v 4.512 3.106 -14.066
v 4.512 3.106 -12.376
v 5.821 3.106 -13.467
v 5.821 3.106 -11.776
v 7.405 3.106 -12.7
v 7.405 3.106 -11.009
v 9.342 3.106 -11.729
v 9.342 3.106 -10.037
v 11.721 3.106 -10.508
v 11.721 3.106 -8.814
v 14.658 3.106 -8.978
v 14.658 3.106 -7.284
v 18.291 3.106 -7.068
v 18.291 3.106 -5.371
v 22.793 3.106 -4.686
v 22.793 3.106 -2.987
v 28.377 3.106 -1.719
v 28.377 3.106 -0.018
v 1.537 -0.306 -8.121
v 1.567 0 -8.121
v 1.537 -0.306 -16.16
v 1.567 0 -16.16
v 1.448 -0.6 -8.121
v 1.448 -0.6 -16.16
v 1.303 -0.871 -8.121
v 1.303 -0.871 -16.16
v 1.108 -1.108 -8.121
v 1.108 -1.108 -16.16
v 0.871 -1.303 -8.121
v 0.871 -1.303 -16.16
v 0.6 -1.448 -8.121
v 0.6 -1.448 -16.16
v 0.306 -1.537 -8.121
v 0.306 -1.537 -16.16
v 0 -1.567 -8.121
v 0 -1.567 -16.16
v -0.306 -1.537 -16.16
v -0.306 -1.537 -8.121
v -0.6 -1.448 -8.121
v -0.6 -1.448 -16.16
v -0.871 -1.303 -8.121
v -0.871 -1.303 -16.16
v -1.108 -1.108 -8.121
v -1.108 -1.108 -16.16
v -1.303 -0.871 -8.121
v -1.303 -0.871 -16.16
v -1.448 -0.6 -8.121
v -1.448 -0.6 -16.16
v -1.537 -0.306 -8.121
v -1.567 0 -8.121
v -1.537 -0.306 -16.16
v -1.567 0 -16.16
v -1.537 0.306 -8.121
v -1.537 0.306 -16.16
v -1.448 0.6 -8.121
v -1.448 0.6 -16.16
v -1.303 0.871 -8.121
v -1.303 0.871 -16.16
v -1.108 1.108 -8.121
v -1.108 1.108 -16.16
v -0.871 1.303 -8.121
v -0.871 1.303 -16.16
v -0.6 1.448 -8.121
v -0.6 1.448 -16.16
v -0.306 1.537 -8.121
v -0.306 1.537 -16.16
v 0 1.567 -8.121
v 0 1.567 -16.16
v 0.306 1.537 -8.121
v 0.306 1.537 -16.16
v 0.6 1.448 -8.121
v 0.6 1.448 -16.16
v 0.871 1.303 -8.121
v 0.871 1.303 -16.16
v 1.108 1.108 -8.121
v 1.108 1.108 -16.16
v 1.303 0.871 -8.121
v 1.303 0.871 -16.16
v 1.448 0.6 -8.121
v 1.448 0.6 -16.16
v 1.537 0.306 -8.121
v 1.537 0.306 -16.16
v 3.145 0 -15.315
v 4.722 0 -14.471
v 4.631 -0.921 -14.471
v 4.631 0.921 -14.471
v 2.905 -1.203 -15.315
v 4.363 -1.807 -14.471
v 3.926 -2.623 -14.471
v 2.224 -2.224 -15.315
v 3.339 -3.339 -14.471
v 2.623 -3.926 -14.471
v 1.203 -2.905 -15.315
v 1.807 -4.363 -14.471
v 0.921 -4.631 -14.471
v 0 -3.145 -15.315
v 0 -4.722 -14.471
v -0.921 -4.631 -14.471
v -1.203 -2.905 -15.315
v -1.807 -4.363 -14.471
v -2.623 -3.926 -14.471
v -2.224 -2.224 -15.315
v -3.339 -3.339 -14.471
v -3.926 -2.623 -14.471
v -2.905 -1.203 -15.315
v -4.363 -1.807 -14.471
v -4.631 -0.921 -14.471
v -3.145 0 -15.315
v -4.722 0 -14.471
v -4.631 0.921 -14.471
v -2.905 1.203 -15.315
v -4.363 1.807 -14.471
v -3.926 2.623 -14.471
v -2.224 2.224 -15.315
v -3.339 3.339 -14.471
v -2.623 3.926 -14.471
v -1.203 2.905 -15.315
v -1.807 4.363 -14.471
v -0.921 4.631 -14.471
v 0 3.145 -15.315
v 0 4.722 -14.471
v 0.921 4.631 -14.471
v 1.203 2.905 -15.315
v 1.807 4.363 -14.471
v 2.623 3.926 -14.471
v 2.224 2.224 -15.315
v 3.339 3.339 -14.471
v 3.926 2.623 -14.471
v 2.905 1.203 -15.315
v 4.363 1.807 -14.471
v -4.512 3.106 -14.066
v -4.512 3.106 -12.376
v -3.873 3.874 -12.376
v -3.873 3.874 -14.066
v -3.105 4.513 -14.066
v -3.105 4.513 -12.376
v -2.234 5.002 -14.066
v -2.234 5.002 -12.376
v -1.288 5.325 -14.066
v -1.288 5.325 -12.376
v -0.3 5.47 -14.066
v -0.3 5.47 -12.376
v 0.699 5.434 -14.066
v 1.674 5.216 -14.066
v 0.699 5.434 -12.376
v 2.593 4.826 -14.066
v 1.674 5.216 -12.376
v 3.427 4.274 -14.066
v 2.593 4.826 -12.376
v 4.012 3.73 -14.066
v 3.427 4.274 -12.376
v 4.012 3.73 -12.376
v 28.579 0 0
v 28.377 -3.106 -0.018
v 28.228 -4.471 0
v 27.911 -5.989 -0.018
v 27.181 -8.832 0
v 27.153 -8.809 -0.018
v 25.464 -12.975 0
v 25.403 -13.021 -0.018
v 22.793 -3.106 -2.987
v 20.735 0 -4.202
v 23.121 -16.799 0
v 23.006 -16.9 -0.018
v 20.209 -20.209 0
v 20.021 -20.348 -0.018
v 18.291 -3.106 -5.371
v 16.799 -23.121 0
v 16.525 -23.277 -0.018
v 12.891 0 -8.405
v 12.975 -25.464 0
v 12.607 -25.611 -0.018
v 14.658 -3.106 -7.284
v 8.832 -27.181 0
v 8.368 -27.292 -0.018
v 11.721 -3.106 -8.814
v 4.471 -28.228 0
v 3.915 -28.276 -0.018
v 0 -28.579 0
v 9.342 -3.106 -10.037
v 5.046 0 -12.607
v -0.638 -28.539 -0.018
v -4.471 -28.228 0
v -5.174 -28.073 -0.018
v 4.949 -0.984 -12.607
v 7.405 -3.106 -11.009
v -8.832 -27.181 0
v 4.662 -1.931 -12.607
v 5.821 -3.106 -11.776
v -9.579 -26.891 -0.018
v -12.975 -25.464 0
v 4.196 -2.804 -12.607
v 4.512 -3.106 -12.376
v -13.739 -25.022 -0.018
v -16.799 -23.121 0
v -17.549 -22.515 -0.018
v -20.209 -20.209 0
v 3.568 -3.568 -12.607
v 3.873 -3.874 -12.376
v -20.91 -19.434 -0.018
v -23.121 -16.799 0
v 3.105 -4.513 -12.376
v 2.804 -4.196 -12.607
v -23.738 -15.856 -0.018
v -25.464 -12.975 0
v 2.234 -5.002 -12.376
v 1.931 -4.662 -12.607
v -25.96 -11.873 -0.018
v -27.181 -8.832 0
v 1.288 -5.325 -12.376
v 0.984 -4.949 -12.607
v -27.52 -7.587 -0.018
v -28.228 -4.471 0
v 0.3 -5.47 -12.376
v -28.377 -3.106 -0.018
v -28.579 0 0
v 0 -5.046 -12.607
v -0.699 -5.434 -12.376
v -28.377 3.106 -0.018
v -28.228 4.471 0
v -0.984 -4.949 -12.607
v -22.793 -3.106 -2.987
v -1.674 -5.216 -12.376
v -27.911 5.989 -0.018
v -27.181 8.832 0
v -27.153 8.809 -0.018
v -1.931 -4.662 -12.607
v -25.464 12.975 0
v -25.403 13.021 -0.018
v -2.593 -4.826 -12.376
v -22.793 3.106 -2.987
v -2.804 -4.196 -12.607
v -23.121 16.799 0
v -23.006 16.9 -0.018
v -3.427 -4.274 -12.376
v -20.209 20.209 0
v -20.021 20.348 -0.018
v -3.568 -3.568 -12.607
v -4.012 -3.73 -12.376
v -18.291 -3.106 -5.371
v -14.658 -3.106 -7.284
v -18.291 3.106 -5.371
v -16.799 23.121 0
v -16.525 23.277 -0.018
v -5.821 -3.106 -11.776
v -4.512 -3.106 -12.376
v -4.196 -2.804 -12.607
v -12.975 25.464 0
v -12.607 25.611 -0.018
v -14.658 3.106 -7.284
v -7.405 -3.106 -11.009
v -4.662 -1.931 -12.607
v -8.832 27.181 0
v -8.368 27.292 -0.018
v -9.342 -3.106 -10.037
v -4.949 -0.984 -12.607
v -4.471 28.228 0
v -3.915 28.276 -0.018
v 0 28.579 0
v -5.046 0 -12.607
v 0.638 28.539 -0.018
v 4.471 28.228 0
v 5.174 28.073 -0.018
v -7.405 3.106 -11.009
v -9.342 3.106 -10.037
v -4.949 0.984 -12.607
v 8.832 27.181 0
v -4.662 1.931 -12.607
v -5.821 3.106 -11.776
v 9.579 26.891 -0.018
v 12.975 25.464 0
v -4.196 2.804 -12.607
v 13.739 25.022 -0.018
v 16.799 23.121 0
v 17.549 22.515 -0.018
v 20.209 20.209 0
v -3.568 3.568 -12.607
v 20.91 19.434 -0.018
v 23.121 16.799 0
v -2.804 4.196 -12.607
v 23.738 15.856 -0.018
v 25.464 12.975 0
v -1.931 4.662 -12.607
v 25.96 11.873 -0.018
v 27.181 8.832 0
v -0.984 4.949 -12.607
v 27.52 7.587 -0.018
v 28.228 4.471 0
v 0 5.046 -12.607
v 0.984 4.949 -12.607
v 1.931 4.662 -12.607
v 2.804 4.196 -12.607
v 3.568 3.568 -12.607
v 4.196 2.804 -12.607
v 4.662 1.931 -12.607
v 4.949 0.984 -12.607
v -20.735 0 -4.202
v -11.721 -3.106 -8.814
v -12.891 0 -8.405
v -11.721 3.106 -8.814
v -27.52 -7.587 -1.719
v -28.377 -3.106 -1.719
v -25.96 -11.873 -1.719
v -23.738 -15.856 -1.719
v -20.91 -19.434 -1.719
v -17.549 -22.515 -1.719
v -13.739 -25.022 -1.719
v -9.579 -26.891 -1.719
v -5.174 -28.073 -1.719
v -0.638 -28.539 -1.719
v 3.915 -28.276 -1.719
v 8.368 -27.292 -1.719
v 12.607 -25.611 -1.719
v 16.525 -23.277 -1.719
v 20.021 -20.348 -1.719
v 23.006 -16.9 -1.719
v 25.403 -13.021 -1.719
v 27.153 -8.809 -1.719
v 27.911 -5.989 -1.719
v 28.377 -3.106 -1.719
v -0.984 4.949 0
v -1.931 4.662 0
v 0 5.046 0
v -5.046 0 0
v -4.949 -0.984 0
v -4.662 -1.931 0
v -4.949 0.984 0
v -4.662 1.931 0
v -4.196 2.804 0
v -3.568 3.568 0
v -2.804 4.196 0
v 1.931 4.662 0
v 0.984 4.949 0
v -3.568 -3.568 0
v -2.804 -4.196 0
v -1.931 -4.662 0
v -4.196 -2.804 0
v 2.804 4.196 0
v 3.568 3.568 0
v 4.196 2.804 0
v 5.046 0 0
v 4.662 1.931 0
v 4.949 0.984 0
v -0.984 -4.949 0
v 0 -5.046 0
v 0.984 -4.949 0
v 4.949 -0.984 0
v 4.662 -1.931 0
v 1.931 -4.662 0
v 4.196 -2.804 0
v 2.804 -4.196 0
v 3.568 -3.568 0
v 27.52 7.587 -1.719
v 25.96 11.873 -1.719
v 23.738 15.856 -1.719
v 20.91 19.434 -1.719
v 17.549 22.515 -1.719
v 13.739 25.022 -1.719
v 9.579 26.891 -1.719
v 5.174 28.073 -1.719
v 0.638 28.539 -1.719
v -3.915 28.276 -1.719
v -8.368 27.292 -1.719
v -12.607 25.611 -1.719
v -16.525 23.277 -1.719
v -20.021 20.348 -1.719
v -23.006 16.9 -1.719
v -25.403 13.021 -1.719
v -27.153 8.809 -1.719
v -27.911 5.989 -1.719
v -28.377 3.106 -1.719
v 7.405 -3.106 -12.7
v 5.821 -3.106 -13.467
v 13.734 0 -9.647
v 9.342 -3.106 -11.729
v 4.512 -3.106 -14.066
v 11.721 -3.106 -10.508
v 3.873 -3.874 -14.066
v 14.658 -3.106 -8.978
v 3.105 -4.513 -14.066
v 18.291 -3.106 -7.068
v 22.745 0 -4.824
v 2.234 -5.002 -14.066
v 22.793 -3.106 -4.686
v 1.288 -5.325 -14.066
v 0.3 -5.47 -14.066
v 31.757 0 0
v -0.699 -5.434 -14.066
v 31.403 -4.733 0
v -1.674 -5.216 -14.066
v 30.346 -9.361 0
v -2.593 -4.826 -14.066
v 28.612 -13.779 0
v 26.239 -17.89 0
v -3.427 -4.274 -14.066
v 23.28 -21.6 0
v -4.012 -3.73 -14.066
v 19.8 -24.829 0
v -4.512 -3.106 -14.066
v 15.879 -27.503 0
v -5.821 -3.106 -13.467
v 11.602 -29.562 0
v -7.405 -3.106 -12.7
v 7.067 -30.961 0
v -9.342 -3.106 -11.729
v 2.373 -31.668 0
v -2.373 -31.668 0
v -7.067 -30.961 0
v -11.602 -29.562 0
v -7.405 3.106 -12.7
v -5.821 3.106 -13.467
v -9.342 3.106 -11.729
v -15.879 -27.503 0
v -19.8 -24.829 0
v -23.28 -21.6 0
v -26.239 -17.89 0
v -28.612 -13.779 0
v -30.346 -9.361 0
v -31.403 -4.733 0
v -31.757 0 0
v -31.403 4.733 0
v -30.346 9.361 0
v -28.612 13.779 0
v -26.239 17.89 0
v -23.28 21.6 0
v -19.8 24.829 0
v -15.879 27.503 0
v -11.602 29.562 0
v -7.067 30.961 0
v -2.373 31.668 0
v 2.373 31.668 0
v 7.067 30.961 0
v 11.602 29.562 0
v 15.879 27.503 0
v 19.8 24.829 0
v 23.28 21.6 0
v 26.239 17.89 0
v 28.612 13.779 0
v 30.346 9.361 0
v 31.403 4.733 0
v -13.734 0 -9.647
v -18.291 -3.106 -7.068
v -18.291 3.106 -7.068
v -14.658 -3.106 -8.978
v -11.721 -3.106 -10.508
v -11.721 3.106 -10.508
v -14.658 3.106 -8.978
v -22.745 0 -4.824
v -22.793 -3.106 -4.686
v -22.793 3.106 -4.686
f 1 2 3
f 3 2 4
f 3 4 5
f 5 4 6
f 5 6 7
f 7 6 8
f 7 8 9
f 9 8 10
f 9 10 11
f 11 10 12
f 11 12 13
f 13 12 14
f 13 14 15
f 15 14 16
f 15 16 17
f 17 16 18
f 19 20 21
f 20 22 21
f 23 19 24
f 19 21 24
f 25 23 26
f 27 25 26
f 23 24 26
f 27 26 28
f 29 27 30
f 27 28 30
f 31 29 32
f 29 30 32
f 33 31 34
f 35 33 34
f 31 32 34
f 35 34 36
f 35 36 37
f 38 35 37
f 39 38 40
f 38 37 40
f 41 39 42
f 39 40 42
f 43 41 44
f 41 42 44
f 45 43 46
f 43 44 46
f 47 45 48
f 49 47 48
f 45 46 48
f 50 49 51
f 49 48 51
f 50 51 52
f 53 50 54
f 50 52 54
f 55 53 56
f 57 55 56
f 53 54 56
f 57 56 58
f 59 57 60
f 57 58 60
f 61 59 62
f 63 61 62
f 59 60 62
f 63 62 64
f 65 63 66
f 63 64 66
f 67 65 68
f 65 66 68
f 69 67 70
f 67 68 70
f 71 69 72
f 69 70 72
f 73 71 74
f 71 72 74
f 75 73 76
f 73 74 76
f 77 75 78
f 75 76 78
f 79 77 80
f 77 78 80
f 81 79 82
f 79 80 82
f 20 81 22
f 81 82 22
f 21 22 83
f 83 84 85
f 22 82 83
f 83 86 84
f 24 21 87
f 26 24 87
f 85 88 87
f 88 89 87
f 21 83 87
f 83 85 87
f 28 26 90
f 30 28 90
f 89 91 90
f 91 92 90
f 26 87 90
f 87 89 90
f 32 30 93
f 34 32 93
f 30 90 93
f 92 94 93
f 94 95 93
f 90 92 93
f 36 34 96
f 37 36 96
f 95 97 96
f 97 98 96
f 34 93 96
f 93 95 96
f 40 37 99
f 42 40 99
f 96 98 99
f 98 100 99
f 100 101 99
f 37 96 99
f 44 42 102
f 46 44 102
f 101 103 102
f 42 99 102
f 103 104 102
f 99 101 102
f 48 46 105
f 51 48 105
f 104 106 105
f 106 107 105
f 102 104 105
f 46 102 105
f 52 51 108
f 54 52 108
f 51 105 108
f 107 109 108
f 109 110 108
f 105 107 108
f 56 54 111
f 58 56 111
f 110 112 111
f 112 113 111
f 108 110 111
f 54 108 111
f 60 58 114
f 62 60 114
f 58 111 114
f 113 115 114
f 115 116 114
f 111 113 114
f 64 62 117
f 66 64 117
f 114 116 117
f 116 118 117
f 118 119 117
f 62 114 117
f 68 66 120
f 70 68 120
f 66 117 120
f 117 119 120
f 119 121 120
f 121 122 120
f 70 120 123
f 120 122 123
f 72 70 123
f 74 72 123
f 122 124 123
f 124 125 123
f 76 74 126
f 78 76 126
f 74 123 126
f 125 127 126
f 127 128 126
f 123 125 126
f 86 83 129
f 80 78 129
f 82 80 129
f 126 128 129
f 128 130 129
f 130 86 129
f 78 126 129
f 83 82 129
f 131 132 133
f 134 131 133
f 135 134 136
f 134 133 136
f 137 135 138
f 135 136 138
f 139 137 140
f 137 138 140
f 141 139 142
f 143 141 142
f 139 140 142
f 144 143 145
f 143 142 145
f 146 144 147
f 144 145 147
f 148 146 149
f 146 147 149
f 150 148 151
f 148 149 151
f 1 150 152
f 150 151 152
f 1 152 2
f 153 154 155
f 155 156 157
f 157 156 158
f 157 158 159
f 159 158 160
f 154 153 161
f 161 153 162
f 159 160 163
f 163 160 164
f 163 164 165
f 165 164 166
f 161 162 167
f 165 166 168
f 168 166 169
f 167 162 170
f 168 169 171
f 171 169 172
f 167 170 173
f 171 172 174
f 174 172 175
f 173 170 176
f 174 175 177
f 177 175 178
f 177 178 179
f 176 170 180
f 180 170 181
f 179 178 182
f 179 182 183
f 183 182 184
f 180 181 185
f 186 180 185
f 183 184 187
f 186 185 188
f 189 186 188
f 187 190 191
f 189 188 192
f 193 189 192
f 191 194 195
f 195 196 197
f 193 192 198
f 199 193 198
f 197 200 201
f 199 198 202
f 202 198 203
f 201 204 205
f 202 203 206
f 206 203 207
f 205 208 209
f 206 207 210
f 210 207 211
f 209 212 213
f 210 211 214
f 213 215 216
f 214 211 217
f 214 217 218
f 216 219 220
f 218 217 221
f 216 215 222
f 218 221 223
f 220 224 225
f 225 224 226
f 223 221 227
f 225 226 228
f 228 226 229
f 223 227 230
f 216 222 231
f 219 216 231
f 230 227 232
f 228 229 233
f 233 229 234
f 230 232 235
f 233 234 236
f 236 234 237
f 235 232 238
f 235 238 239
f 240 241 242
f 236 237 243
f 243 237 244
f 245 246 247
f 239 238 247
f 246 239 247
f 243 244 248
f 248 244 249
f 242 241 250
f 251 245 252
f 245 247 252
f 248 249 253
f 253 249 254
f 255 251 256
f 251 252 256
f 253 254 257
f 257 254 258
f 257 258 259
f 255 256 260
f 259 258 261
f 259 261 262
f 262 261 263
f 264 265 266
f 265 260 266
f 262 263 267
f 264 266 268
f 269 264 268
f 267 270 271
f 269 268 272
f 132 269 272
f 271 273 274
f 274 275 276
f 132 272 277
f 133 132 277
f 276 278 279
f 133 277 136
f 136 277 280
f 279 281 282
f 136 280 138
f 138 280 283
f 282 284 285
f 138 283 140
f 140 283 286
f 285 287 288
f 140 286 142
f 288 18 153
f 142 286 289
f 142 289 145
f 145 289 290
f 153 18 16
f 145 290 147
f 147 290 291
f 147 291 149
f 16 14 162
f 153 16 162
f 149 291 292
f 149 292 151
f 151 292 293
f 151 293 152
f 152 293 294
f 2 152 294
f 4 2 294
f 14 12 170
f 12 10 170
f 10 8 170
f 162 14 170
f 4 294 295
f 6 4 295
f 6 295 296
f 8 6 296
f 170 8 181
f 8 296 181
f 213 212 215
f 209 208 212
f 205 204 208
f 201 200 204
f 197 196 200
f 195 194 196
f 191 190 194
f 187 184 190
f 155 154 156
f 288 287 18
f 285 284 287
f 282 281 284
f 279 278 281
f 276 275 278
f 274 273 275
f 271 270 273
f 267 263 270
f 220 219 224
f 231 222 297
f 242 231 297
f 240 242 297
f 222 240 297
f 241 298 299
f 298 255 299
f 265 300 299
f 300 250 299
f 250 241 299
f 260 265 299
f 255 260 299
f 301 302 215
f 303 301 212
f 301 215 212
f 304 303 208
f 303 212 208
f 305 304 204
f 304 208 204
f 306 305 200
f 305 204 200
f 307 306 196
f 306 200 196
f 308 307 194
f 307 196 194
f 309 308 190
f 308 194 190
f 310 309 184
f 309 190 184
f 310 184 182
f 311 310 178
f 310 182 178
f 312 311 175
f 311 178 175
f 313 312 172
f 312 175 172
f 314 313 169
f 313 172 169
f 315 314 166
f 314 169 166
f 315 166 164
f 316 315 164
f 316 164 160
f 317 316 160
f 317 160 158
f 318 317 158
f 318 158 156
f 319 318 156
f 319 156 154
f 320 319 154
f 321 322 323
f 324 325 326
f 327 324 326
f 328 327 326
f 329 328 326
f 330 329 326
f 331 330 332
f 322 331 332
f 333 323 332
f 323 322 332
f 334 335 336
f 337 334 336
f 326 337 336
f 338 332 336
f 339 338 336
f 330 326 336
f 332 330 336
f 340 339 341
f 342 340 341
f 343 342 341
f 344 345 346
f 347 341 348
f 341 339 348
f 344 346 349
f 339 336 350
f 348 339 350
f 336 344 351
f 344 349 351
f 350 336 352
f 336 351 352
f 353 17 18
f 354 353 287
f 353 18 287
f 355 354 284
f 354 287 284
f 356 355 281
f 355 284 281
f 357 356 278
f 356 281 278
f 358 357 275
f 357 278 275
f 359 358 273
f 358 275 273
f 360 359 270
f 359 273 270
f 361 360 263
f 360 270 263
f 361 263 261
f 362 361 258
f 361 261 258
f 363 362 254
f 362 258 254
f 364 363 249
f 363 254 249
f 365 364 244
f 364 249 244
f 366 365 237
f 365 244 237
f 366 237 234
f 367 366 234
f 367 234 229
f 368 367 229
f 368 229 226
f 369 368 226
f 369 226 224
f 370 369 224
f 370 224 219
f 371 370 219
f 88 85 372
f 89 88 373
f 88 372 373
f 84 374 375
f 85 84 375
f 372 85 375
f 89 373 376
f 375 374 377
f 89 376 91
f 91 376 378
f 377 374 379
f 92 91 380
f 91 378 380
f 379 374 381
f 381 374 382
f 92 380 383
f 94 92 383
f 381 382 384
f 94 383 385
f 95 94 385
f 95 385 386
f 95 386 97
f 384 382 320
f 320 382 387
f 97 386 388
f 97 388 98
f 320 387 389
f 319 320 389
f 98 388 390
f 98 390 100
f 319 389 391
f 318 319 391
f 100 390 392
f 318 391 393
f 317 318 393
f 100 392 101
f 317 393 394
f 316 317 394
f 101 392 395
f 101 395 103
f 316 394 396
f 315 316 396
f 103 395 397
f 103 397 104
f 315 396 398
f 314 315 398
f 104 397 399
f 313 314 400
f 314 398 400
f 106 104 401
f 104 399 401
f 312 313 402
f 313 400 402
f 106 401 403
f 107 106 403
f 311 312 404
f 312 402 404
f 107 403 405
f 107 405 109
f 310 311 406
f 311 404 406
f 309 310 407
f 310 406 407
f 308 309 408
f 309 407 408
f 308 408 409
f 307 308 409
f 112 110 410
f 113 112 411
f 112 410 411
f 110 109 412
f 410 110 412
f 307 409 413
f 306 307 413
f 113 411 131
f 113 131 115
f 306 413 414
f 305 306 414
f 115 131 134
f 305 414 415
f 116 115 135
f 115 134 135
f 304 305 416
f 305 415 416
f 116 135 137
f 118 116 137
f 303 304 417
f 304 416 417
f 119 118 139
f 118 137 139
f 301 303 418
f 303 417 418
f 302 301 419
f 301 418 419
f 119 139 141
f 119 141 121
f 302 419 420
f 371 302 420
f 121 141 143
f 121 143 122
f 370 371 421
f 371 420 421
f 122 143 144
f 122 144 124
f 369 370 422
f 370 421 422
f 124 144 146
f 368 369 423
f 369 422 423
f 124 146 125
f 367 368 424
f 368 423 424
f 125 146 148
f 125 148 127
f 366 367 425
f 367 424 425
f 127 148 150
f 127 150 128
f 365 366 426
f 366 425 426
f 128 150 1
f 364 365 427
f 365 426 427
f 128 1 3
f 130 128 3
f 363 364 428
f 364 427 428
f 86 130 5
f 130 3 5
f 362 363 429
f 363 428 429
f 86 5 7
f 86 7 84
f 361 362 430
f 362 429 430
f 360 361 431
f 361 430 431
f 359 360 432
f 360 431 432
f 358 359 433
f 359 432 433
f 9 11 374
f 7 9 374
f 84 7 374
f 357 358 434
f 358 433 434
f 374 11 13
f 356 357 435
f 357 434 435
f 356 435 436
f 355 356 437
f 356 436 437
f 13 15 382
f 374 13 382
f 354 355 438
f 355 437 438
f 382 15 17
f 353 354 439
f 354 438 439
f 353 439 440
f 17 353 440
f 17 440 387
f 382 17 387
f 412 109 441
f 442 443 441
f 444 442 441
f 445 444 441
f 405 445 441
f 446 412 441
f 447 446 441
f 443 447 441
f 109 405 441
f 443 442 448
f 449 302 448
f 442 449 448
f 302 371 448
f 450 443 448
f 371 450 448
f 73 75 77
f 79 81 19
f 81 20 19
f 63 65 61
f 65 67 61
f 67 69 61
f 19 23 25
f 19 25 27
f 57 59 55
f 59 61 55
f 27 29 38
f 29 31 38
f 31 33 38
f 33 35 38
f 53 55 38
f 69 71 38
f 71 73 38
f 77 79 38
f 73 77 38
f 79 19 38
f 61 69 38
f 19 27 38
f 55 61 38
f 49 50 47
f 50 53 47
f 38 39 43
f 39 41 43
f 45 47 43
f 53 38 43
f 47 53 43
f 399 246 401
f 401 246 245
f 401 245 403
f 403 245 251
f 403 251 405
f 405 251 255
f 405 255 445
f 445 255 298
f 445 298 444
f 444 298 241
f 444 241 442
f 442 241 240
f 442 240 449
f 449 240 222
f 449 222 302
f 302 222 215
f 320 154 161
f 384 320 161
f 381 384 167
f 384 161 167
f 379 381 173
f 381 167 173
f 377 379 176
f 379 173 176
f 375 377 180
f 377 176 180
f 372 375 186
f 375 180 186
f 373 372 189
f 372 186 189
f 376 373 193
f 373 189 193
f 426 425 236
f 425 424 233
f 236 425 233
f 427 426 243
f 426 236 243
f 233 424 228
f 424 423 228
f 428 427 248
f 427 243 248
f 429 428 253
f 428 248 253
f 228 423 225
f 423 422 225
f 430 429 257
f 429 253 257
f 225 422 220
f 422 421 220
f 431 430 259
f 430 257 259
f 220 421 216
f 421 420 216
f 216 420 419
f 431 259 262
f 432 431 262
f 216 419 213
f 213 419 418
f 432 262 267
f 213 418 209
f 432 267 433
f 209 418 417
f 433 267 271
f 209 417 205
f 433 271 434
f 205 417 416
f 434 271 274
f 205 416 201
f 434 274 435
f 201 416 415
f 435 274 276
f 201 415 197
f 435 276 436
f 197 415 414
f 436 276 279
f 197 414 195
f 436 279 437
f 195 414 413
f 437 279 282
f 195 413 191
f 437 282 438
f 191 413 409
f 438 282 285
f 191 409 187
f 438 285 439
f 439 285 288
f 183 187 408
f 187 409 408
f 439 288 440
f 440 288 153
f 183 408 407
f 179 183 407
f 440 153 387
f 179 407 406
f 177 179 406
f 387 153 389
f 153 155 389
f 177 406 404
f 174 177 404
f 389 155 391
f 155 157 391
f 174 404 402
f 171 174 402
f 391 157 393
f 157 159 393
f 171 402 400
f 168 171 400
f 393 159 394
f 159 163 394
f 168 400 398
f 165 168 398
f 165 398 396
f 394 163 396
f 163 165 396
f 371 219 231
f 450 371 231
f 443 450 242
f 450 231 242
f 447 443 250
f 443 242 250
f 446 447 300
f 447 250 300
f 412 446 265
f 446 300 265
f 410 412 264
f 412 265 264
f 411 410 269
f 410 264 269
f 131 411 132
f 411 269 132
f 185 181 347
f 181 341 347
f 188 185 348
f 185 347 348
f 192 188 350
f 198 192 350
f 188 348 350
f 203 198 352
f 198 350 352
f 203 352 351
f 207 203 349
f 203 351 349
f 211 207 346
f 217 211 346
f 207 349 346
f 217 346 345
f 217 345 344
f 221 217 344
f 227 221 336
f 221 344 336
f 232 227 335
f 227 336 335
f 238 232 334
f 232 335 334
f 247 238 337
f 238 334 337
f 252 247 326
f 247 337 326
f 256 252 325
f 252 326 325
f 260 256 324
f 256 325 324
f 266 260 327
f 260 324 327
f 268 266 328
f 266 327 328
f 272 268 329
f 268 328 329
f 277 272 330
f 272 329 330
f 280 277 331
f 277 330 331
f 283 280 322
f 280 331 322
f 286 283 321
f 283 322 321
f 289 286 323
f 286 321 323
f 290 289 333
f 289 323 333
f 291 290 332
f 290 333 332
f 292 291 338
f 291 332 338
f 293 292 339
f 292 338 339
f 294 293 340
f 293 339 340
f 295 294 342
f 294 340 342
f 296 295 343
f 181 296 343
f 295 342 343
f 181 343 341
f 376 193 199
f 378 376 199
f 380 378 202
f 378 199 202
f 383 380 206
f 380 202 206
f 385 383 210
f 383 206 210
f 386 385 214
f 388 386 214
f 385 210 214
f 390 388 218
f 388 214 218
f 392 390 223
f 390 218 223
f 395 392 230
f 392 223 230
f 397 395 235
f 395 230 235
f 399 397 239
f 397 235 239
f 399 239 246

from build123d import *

# Parameters (mm, degrees)
F3_DEPTH = 25.4


with BuildPart() as f1:
    # F0 (on Front) → F1 (revolve)
    with BuildSketch(Plane.XZ):
        Polygon((4.520118, 0), (0, 0), (0, -7.362884), (0, -8.120686), (1.567202, -8.120686), (1.567202, -14.471013), (1.567202, -16.159639), (4.721958, -14.471013), (31.757258, 0), (28.579464, 0), (5.046357, -12.607159), (5.046357, 0), align=None)
    revolve(axis=Axis((0, 0, -4.060343), (0, 0, -1)))

    # F2 (on Top) → F3 (cut)
    with BuildSketch(Plane.XY):
        with BuildLine():
            ThreePointArc((-4.51249, 3.106461), (0, 5.478381), (4.51249, 3.106461))
            Line((4.51249, 3.106461), (28.376638, 3.106461))
            ThreePointArc((28.376638, 3.106461), (0, 28.546168), (-28.376638, 3.106461))
            Line((-28.376638, 3.106461), (-4.51249, 3.106461))
        make_face()
        with BuildLine():
            Line((28.376638, -3.106461), (4.51249, -3.106461))
            ThreePointArc((4.51249, -3.106461), (0, -5.478381), (-4.51249, -3.106461))
            Line((-4.51249, -3.106461), (-28.376638, -3.106461))
            ThreePointArc((-28.376638, -3.106461), (0, -28.546168), (28.376638, -3.106461))
        make_face()
    extrude(amount=-F3_DEPTH, mode=Mode.SUBTRACT)


solid = f1.part
